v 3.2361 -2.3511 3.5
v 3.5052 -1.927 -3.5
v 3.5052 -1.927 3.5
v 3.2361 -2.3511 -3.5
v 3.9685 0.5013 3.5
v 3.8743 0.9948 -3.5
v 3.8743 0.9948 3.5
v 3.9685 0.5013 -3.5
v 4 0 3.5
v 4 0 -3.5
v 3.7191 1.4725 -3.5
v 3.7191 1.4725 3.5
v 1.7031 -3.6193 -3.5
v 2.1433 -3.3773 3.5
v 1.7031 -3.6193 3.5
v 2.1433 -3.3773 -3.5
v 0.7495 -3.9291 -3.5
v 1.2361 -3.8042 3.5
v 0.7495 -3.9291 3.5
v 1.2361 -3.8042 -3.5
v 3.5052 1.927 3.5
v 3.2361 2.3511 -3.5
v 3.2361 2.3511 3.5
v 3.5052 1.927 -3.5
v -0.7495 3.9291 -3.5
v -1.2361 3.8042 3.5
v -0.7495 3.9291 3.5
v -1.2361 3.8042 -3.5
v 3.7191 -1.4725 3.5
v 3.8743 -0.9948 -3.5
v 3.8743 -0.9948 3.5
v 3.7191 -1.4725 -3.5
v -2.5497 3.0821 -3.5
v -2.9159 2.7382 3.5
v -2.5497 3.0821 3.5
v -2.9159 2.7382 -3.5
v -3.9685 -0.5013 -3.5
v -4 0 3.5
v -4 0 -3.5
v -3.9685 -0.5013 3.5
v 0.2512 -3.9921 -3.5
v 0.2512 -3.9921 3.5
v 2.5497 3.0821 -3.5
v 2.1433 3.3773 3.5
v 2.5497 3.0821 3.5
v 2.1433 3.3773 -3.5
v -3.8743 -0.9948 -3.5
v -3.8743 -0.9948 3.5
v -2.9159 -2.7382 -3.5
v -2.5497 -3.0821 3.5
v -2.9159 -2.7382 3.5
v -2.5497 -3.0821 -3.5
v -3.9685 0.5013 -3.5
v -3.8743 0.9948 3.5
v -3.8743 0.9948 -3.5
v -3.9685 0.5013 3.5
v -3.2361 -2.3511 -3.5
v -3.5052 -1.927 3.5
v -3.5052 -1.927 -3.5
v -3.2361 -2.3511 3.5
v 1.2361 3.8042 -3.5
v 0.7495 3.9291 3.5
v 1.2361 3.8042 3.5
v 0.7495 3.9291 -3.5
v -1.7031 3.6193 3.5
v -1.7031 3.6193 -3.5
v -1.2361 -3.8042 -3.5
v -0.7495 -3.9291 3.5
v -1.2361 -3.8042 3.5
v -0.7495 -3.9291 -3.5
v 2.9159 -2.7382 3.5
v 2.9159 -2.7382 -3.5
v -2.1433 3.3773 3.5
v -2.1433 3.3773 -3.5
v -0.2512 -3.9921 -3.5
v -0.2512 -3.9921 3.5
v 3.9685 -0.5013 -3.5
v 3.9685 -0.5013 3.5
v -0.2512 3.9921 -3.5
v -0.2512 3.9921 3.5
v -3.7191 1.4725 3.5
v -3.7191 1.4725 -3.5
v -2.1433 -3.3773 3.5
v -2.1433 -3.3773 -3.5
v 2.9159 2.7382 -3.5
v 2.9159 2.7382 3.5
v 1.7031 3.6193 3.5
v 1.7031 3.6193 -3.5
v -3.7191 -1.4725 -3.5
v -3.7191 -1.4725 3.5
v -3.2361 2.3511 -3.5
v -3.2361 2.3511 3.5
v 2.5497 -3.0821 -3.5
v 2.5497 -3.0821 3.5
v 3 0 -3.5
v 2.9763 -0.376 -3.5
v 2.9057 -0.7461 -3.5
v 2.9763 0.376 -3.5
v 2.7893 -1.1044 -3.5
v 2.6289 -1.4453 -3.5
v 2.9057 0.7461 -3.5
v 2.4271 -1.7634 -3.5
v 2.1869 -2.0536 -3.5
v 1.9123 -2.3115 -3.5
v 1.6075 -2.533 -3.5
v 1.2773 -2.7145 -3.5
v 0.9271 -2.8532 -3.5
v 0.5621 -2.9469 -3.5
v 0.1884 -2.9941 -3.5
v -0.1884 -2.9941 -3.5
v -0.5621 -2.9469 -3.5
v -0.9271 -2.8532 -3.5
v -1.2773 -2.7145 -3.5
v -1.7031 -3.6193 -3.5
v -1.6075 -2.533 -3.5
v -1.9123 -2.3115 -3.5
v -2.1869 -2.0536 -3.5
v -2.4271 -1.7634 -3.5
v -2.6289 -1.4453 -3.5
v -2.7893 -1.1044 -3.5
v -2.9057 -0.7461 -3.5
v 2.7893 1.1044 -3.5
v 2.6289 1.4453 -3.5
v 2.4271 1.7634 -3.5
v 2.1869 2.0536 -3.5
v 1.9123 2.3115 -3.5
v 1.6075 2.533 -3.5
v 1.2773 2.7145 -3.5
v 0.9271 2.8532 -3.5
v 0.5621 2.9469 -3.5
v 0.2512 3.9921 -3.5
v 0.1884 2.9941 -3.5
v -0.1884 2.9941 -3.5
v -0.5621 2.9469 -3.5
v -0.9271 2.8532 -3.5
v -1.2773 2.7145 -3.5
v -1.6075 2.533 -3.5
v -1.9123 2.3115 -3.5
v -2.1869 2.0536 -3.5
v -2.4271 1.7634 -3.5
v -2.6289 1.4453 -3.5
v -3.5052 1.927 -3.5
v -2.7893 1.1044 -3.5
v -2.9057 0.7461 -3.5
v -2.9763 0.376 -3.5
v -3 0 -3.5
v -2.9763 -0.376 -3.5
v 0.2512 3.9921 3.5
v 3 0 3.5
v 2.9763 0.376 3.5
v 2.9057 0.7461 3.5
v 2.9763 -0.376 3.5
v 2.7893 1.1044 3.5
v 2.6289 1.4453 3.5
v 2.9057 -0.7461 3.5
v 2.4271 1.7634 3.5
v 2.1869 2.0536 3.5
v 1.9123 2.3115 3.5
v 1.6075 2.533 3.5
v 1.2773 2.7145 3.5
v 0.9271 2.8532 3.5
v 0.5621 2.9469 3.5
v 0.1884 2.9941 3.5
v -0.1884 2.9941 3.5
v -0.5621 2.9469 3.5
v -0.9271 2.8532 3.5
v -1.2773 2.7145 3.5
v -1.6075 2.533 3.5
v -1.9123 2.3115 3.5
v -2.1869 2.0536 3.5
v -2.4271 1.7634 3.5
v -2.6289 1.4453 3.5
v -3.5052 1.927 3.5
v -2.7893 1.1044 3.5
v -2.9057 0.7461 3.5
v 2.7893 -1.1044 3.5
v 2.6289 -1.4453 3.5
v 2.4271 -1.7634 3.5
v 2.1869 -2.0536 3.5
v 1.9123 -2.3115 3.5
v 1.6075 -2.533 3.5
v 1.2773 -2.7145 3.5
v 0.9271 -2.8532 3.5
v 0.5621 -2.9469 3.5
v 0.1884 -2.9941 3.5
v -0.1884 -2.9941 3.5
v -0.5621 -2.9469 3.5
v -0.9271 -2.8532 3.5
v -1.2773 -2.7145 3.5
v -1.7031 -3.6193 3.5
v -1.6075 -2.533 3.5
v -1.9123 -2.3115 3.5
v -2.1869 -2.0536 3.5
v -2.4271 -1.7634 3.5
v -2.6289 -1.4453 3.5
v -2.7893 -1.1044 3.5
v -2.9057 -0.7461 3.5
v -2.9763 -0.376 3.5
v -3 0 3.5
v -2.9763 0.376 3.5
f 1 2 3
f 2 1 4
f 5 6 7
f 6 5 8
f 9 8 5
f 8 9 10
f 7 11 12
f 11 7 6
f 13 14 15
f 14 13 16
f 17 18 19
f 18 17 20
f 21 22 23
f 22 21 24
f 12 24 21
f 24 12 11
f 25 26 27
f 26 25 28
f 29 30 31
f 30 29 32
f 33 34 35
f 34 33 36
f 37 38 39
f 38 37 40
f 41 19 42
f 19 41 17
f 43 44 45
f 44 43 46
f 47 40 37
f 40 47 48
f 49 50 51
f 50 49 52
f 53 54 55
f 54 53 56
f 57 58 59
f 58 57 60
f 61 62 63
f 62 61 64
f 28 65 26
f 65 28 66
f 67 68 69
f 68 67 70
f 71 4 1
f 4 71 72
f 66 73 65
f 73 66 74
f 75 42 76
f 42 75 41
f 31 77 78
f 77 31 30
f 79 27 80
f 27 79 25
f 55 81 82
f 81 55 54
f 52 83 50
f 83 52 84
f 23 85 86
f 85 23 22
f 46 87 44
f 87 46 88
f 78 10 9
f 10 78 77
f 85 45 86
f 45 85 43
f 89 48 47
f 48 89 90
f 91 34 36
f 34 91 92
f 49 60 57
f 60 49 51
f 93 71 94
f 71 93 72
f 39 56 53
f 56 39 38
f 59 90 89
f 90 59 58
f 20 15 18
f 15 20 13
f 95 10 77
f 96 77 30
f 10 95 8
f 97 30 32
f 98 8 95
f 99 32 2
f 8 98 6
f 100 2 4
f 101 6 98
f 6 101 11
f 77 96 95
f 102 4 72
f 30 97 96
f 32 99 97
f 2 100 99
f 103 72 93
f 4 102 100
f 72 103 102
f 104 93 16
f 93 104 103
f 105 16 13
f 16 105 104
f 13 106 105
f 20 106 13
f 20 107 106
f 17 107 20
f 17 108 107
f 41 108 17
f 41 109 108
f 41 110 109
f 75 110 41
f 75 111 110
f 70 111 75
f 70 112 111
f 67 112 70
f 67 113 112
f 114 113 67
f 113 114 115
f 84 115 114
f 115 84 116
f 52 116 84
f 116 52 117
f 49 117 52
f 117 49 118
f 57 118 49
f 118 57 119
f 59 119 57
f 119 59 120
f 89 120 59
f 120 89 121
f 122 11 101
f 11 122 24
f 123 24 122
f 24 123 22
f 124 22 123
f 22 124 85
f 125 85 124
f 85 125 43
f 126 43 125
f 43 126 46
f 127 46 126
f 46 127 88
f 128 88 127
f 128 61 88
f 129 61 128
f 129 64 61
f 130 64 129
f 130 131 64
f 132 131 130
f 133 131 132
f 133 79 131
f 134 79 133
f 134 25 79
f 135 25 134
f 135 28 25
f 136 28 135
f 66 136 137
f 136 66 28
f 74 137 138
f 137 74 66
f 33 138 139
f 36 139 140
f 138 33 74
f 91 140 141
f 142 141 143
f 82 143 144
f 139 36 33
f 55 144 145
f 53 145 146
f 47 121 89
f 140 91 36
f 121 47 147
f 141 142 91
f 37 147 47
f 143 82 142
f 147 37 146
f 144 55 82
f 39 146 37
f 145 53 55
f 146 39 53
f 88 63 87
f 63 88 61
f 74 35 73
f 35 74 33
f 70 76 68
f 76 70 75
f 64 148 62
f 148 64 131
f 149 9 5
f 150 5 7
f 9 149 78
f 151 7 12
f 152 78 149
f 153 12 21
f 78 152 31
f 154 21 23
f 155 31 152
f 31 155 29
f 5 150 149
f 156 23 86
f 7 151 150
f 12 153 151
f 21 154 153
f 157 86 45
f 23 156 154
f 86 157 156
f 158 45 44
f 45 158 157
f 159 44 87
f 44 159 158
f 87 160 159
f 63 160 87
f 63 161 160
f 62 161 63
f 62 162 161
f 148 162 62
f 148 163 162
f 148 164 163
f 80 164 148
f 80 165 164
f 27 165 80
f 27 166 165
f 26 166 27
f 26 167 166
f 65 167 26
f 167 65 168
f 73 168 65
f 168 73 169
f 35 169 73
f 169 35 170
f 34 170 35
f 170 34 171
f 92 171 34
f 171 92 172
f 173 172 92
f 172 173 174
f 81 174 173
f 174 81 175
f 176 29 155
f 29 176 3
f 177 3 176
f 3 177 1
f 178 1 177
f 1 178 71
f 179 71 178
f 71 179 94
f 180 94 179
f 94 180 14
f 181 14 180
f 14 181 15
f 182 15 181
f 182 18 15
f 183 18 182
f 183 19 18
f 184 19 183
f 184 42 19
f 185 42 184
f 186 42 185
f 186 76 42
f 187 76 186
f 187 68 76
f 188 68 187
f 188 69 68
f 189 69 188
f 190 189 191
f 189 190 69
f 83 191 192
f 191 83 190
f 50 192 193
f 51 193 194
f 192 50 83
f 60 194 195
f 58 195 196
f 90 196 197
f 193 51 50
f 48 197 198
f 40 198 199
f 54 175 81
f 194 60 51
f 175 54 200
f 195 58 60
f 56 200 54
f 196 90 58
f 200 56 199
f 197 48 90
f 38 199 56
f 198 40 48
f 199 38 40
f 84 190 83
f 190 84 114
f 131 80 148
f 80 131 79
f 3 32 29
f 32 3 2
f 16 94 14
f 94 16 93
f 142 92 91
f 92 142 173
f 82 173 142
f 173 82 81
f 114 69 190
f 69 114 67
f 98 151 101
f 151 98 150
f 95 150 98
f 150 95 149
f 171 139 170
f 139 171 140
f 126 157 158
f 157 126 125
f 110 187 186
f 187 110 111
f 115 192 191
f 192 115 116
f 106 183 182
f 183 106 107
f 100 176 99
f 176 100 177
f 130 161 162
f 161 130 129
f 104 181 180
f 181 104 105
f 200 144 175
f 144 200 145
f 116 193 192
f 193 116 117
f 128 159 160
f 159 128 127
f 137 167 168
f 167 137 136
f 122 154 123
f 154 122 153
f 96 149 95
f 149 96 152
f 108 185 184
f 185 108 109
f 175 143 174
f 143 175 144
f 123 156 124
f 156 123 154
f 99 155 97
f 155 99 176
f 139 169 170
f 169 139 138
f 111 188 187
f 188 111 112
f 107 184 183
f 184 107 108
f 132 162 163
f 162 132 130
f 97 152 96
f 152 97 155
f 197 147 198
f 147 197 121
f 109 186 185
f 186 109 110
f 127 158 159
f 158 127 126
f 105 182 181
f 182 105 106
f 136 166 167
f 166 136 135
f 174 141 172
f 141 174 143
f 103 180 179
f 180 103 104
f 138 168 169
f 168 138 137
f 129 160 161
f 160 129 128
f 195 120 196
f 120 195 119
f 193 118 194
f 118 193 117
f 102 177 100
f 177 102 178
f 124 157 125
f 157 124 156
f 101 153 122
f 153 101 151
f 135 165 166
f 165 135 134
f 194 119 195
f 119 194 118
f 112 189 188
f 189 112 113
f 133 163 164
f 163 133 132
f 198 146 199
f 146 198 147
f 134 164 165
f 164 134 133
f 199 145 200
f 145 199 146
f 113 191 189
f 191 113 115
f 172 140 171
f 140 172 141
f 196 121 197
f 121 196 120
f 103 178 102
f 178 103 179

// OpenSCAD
$fn = 50;


difference() {
	union() {
		translate(v = [0, 0, -3.5000000000]) {
			cylinder(h = 7, r = 4.0000000000);
		}
	}
	union() {
		translate(v = [0, 0, -100.0000000000]) {
			cylinder(h = 200, r = 3.0000000000);
		}
	}
}
